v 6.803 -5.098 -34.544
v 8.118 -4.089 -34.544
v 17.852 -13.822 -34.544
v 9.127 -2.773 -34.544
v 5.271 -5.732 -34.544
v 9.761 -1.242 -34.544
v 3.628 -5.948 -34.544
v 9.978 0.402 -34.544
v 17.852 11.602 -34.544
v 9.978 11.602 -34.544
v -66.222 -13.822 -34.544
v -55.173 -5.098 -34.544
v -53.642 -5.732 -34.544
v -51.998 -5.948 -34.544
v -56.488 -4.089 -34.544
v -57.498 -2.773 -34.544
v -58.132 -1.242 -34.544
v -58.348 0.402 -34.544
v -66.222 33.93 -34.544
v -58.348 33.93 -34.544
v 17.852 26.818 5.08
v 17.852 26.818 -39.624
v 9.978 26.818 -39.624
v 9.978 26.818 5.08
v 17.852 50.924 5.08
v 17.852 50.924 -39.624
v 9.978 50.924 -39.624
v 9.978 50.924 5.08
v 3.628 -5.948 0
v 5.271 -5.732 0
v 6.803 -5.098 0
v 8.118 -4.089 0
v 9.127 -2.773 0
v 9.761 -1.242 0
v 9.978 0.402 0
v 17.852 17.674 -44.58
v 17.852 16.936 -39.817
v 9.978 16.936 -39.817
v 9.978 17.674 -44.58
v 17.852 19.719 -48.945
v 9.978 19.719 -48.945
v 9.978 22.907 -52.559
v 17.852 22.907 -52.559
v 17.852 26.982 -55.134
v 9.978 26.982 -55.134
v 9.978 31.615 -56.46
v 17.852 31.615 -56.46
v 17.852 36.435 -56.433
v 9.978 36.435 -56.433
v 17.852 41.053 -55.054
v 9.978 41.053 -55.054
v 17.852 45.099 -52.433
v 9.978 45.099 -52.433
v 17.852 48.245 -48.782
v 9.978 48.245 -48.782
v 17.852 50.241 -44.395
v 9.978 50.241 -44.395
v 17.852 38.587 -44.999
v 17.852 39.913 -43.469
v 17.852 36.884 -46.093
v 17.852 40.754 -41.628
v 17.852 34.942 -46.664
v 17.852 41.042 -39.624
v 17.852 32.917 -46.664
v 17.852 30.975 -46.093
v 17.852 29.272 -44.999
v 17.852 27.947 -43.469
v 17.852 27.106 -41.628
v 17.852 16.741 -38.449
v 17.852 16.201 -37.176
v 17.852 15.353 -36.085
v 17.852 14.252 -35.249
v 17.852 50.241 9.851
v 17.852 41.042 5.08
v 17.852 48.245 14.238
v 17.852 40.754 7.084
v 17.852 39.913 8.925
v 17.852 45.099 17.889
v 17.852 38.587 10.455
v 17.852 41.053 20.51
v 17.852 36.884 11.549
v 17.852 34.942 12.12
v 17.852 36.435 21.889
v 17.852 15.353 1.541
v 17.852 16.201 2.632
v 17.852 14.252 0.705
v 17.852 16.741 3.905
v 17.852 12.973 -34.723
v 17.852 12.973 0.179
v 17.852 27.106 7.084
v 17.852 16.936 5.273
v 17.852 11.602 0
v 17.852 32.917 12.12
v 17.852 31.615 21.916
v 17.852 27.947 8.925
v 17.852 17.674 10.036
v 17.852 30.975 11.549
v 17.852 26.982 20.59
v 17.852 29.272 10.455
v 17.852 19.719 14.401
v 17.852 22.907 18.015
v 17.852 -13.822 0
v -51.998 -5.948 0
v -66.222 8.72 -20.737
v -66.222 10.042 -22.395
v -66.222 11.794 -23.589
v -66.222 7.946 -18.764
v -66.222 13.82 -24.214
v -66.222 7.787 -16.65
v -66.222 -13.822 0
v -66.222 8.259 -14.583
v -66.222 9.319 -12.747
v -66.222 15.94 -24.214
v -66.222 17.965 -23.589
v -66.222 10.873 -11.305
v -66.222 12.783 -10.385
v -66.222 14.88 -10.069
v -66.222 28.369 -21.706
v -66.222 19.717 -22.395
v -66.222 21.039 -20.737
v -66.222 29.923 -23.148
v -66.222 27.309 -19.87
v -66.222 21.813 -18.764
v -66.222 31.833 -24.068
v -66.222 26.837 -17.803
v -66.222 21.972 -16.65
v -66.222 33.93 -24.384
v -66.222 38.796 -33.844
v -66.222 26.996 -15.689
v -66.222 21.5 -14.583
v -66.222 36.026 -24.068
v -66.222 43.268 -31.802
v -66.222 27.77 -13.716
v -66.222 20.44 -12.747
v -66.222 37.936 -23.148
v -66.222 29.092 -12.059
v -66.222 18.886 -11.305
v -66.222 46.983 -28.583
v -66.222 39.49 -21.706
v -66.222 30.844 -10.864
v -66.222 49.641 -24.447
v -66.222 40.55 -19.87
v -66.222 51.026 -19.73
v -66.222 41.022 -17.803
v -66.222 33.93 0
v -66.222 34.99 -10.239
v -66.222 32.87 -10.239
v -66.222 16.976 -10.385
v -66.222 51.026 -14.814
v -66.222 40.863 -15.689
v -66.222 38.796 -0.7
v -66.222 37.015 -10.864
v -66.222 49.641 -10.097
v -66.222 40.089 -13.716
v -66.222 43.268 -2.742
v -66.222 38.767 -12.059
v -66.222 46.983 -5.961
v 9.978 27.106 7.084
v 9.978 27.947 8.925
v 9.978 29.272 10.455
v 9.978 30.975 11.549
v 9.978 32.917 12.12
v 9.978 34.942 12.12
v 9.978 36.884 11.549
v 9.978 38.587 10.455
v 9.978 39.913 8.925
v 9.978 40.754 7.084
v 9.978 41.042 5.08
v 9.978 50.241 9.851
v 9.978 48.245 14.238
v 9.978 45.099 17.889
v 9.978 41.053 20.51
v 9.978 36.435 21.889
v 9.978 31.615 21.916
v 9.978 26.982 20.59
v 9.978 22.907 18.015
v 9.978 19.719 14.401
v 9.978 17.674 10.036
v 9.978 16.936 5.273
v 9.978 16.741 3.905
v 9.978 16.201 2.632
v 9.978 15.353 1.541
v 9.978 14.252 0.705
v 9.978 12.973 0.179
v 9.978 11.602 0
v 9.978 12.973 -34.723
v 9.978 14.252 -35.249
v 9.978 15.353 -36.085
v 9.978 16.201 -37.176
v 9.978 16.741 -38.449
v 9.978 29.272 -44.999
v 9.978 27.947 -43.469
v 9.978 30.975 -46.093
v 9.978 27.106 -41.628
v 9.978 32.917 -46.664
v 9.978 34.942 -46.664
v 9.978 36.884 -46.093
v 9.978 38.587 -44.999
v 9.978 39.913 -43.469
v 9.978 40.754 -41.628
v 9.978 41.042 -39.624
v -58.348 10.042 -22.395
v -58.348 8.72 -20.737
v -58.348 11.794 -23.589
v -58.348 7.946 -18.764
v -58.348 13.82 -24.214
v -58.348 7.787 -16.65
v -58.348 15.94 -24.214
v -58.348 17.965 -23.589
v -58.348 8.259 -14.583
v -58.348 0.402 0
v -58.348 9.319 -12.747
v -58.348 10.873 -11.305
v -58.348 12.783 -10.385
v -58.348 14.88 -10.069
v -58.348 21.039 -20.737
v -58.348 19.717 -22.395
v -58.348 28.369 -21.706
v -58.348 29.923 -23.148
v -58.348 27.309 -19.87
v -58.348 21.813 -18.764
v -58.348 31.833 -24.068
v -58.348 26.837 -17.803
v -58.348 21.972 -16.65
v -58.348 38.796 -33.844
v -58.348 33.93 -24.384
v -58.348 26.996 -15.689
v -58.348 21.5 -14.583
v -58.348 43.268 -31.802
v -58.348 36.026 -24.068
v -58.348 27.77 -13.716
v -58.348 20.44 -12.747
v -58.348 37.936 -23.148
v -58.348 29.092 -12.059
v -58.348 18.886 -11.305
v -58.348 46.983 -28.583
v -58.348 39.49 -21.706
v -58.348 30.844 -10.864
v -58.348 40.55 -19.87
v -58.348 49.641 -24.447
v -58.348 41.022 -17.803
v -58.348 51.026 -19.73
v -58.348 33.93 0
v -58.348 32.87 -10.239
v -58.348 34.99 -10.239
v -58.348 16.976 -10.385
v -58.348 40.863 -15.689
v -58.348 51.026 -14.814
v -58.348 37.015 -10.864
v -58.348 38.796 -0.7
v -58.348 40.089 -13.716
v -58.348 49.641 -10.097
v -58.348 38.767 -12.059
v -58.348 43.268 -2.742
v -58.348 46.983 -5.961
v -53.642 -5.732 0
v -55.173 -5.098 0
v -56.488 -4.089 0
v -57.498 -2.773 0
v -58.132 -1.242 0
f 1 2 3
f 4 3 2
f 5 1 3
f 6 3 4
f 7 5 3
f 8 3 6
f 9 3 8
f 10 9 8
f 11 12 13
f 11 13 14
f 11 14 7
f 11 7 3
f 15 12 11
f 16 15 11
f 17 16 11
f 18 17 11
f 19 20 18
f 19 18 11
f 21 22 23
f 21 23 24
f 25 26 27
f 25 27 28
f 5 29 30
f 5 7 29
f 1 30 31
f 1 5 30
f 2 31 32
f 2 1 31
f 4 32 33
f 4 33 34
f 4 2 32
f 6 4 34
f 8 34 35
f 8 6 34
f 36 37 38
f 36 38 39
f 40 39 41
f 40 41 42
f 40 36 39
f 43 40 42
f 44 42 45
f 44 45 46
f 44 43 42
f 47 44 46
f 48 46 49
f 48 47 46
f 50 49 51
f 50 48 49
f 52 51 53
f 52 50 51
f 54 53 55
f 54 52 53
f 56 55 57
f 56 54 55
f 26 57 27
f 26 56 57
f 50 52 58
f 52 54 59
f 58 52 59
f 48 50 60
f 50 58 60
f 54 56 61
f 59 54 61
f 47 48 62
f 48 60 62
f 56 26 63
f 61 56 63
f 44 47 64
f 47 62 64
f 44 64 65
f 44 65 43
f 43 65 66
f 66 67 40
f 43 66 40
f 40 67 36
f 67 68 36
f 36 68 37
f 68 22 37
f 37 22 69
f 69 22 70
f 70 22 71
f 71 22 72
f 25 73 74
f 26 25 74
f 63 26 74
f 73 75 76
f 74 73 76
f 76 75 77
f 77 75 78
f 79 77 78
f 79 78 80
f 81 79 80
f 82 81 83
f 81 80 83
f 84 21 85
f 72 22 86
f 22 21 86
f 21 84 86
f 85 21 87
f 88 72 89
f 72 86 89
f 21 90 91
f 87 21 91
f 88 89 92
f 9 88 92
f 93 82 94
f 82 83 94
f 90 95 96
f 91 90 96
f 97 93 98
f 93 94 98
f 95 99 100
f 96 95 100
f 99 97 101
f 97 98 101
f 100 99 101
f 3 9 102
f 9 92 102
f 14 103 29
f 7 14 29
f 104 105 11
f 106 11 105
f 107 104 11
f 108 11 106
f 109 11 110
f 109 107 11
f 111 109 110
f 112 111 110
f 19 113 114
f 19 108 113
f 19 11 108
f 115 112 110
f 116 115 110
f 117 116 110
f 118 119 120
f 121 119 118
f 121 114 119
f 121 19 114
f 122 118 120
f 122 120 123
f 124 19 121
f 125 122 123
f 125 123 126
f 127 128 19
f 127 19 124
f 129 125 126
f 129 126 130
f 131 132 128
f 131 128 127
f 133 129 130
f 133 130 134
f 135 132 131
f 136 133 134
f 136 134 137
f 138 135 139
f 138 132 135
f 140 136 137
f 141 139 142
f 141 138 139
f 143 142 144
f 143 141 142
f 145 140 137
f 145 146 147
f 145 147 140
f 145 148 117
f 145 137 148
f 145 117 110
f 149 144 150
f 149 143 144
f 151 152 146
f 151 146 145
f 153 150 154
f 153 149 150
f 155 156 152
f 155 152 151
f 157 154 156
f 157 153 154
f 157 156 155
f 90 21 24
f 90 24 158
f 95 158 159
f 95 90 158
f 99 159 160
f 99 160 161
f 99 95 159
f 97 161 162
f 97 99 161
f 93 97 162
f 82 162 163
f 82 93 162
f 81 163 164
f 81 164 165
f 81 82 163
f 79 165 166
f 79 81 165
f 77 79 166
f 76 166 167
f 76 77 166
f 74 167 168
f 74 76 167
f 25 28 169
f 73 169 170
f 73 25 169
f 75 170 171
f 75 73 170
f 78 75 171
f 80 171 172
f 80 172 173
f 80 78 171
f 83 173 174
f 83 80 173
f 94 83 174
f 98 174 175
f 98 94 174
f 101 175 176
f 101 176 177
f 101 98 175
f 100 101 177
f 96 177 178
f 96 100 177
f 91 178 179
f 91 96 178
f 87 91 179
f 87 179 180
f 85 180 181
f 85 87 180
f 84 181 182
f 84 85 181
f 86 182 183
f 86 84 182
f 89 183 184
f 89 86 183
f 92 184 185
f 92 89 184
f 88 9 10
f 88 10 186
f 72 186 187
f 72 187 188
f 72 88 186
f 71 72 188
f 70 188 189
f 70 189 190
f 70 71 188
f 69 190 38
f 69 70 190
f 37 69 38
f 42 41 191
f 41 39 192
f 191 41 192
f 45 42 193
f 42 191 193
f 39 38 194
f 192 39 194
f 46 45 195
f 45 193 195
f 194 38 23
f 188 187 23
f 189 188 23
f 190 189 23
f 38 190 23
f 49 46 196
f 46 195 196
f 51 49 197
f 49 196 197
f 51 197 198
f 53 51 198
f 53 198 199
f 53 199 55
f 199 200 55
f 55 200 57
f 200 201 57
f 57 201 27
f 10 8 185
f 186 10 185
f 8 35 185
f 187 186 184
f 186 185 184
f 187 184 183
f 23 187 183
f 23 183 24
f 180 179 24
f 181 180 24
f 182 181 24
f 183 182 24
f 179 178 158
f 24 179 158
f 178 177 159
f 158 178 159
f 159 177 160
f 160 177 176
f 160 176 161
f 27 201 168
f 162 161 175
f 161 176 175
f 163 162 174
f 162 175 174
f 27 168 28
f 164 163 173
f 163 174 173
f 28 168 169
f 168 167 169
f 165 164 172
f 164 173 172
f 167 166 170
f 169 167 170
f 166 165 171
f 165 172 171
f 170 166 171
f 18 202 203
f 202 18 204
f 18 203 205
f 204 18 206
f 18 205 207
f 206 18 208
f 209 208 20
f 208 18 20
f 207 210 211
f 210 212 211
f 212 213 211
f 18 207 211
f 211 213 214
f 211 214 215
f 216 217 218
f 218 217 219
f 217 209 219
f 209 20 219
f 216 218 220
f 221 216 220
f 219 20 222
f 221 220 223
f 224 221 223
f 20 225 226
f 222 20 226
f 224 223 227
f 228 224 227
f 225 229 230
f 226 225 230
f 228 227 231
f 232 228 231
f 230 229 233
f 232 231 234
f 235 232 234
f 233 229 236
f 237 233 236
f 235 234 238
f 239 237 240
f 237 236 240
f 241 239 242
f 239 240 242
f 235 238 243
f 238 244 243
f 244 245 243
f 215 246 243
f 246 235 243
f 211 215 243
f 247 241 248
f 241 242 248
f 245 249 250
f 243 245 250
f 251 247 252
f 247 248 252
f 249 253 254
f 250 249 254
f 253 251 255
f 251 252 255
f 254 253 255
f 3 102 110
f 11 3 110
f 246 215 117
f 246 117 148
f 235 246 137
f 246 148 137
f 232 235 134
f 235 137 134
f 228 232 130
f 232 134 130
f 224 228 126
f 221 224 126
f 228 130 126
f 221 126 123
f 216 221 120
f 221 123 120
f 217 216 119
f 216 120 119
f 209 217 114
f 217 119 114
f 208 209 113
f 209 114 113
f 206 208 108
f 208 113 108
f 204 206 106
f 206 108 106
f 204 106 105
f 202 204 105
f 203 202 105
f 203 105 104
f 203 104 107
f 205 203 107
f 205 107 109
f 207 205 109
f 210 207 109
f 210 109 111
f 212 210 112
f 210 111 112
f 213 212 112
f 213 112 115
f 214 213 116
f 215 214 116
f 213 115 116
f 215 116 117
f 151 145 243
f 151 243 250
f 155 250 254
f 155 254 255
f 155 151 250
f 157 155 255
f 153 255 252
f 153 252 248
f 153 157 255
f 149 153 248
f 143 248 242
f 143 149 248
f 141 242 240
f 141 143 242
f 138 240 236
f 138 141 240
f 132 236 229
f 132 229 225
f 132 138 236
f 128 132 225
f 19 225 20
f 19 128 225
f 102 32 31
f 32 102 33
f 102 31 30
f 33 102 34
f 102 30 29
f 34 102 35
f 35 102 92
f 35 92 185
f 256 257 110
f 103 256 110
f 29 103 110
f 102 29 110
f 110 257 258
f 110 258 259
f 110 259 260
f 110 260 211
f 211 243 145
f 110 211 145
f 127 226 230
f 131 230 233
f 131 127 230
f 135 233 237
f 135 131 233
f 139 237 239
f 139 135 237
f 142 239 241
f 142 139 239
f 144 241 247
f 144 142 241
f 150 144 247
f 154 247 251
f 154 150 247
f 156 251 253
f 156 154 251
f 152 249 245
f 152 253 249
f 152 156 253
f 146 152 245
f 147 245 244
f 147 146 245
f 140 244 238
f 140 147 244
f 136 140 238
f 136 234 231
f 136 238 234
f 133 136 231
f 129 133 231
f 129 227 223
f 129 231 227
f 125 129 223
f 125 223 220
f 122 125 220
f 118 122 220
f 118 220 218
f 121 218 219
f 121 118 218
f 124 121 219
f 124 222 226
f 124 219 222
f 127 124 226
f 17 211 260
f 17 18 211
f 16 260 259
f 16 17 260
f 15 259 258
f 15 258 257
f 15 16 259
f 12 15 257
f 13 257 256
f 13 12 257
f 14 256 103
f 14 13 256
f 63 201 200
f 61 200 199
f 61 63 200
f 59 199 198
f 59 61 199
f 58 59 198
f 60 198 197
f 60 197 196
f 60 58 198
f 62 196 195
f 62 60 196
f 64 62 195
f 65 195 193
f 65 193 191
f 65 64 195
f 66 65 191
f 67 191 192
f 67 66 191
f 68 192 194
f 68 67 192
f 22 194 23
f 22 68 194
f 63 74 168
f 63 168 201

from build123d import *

# Parameters (mm, degrees)
BOSS_EXTRUDE1_DEPTH = 34.544
SKETCH2_R           = 7.112
CUT_EXTRUDE1_DEPTH  = 7.874
BOSS_EXTRUDE2_DEPTH = 7.874
BOSS_EXTRUDE3_DEPTH = 7.874
SKETCH3_3_W         = 34.544
SKETCH3_3_H         = 7.112
CUT_EXTRUDE2_DEPTH  = 34.544
FILLET1_R           = 6.35


with BuildPart() as part:
    # Sketch1 → Boss-Extrude1 (new body)
    with BuildSketch(Plane.XY):
        Polygon((-66.222358974, 33.929598007), (-58.348358974, 33.929598007), (-58.348358974, -5.948401993), (9.977641026, -5.948401993), (9.977641026, 33.929598007), (17.851641026, 33.929598007), (17.851641026, -13.822401993), (-66.222358974, -13.822401993), align=None)
    extrude(amount=-BOSS_EXTRUDE1_DEPTH)

    # Sketch2 → Cut-Extrude1 (cut)
    with BuildSketch(Plane.ZY.offset(66.222358974)):
        with Locations((-17.272, 33.929598007)):
            Circle(SKETCH2_R)
        with Locations((-17.181485908, 14.879598007)):
            Circle(SKETCH2_R)
    extrude(amount=-CUT_EXTRUDE1_DEPTH, mode=Mode.SUBTRACT)

    # Sketch2<3> → Boss-Extrude2 (add)
    with BuildSketch(Plane.ZY.offset(66.222358974)):
        with BuildLine():
            Line((-10.16, 33.929598007), (0, 33.929598007))
            ThreePointArc((0, 33.929598007), (-17.272, 51.201598007), (-34.544, 33.929598007))
            Line((-34.544, 33.929598007), (-24.384, 33.929598007))
            ThreePointArc((-24.384, 33.929598007), (-17.272, 41.041598007), (-10.16, 33.929598007))
        make_face()
    extrude(amount=-BOSS_EXTRUDE2_DEPTH)

    # Sketch3 → Boss-Extrude3 (add)
    with BuildSketch(Plane(origin=(17.851641026, 0, 0), x_dir=(0, 0, -1), z_dir=(1, 0, 0))):
        with BuildLine():
            ThreePointArc((-5.08, 16.93495131), (-5.176663199, 16.935226216), (-5.27332327, 16.936050924))
            ThreePointArc((-5.27332327, 16.936050924), (-1.540900629, 15.352589798), (0, 11.602396048))
            Line((0, 11.602396048), (0, 16.93495131))
            Line((0, 16.93495131), (-5.08, 16.93495131))
        make_face()
        with BuildLine():
            Line((39.624, 50.924244704), (-5.08, 50.924244704))
            ThreePointArc((-5.08, 50.924244704), (-22.074371791, 34.026261206), (-5.27332327, 16.936050924))
            ThreePointArc((-5.27332327, 16.936050924), (-5.176663199, 16.935226216), (-5.08, 16.93495131))
            Line((-5.08, 16.93495131), (0, 16.93495131))
            Line((0, 16.93495131), (0, 26.817598007))
            Line((0, 26.817598007), (-5.08, 26.817598007))
            ThreePointArc((-5.08, 26.817598007), (-12.192, 33.929598007), (-5.08, 41.041598007))
            Line((-5.08, 41.041598007), (39.624, 41.041598007))
            ThreePointArc((39.624, 41.041598007), (46.736, 33.929598007), (39.624, 26.817598007))
            Line((39.624, 26.817598007), (34.544, 26.817598007))
            Line((34.544, 26.817598007), (34.544, 16.93495131))
            Line((34.544, 16.93495131), (39.624, 16.93495131))
            ThreePointArc((39.624, 16.93495131), (39.72066289, 16.935226214), (39.817322653, 16.936050917))
            ThreePointArc((39.817322653, 16.936050917), (56.618371793, 34.026260897), (39.624, 50.924244704))
        make_face()
        with BuildLine():
            ThreePointArc((34.544, 11.602396048), (36.084900412, 15.352589578), (39.817322653, 16.936050917))
            ThreePointArc((39.817322653, 16.936050917), (39.72066289, 16.935226214), (39.624, 16.93495131))
            Line((39.624, 16.93495131), (34.544, 16.93495131))
            Line((34.544, 16.93495131), (34.544, 11.602396048))
        make_face()
    extrude(amount=-BOSS_EXTRUDE3_DEPTH)

    # Sketch3<3> → Cut-Extrude2 (cut)
    with BuildSketch(Plane(origin=(17.851641026, 0, 0), x_dir=(0, 0, -1), z_dir=(1, 0, 0))):
        with Locations((17.272, 30.373598007)):
            Rectangle(SKETCH3_3_W, SKETCH3_3_H)
    extrude(amount=-CUT_EXTRUDE2_DEPTH, mode=Mode.SUBTRACT)

    # Fillet1
    fillet1_edges = [part.edges().sort_by_distance(p)[0] for p in [
        (-58.348358974, -5.948401993, -17.272),
        (9.977641026, -5.948401993, -17.272),
    ]]
    fillet(fillet1_edges, radius=FILLET1_R)


solid = part.part
